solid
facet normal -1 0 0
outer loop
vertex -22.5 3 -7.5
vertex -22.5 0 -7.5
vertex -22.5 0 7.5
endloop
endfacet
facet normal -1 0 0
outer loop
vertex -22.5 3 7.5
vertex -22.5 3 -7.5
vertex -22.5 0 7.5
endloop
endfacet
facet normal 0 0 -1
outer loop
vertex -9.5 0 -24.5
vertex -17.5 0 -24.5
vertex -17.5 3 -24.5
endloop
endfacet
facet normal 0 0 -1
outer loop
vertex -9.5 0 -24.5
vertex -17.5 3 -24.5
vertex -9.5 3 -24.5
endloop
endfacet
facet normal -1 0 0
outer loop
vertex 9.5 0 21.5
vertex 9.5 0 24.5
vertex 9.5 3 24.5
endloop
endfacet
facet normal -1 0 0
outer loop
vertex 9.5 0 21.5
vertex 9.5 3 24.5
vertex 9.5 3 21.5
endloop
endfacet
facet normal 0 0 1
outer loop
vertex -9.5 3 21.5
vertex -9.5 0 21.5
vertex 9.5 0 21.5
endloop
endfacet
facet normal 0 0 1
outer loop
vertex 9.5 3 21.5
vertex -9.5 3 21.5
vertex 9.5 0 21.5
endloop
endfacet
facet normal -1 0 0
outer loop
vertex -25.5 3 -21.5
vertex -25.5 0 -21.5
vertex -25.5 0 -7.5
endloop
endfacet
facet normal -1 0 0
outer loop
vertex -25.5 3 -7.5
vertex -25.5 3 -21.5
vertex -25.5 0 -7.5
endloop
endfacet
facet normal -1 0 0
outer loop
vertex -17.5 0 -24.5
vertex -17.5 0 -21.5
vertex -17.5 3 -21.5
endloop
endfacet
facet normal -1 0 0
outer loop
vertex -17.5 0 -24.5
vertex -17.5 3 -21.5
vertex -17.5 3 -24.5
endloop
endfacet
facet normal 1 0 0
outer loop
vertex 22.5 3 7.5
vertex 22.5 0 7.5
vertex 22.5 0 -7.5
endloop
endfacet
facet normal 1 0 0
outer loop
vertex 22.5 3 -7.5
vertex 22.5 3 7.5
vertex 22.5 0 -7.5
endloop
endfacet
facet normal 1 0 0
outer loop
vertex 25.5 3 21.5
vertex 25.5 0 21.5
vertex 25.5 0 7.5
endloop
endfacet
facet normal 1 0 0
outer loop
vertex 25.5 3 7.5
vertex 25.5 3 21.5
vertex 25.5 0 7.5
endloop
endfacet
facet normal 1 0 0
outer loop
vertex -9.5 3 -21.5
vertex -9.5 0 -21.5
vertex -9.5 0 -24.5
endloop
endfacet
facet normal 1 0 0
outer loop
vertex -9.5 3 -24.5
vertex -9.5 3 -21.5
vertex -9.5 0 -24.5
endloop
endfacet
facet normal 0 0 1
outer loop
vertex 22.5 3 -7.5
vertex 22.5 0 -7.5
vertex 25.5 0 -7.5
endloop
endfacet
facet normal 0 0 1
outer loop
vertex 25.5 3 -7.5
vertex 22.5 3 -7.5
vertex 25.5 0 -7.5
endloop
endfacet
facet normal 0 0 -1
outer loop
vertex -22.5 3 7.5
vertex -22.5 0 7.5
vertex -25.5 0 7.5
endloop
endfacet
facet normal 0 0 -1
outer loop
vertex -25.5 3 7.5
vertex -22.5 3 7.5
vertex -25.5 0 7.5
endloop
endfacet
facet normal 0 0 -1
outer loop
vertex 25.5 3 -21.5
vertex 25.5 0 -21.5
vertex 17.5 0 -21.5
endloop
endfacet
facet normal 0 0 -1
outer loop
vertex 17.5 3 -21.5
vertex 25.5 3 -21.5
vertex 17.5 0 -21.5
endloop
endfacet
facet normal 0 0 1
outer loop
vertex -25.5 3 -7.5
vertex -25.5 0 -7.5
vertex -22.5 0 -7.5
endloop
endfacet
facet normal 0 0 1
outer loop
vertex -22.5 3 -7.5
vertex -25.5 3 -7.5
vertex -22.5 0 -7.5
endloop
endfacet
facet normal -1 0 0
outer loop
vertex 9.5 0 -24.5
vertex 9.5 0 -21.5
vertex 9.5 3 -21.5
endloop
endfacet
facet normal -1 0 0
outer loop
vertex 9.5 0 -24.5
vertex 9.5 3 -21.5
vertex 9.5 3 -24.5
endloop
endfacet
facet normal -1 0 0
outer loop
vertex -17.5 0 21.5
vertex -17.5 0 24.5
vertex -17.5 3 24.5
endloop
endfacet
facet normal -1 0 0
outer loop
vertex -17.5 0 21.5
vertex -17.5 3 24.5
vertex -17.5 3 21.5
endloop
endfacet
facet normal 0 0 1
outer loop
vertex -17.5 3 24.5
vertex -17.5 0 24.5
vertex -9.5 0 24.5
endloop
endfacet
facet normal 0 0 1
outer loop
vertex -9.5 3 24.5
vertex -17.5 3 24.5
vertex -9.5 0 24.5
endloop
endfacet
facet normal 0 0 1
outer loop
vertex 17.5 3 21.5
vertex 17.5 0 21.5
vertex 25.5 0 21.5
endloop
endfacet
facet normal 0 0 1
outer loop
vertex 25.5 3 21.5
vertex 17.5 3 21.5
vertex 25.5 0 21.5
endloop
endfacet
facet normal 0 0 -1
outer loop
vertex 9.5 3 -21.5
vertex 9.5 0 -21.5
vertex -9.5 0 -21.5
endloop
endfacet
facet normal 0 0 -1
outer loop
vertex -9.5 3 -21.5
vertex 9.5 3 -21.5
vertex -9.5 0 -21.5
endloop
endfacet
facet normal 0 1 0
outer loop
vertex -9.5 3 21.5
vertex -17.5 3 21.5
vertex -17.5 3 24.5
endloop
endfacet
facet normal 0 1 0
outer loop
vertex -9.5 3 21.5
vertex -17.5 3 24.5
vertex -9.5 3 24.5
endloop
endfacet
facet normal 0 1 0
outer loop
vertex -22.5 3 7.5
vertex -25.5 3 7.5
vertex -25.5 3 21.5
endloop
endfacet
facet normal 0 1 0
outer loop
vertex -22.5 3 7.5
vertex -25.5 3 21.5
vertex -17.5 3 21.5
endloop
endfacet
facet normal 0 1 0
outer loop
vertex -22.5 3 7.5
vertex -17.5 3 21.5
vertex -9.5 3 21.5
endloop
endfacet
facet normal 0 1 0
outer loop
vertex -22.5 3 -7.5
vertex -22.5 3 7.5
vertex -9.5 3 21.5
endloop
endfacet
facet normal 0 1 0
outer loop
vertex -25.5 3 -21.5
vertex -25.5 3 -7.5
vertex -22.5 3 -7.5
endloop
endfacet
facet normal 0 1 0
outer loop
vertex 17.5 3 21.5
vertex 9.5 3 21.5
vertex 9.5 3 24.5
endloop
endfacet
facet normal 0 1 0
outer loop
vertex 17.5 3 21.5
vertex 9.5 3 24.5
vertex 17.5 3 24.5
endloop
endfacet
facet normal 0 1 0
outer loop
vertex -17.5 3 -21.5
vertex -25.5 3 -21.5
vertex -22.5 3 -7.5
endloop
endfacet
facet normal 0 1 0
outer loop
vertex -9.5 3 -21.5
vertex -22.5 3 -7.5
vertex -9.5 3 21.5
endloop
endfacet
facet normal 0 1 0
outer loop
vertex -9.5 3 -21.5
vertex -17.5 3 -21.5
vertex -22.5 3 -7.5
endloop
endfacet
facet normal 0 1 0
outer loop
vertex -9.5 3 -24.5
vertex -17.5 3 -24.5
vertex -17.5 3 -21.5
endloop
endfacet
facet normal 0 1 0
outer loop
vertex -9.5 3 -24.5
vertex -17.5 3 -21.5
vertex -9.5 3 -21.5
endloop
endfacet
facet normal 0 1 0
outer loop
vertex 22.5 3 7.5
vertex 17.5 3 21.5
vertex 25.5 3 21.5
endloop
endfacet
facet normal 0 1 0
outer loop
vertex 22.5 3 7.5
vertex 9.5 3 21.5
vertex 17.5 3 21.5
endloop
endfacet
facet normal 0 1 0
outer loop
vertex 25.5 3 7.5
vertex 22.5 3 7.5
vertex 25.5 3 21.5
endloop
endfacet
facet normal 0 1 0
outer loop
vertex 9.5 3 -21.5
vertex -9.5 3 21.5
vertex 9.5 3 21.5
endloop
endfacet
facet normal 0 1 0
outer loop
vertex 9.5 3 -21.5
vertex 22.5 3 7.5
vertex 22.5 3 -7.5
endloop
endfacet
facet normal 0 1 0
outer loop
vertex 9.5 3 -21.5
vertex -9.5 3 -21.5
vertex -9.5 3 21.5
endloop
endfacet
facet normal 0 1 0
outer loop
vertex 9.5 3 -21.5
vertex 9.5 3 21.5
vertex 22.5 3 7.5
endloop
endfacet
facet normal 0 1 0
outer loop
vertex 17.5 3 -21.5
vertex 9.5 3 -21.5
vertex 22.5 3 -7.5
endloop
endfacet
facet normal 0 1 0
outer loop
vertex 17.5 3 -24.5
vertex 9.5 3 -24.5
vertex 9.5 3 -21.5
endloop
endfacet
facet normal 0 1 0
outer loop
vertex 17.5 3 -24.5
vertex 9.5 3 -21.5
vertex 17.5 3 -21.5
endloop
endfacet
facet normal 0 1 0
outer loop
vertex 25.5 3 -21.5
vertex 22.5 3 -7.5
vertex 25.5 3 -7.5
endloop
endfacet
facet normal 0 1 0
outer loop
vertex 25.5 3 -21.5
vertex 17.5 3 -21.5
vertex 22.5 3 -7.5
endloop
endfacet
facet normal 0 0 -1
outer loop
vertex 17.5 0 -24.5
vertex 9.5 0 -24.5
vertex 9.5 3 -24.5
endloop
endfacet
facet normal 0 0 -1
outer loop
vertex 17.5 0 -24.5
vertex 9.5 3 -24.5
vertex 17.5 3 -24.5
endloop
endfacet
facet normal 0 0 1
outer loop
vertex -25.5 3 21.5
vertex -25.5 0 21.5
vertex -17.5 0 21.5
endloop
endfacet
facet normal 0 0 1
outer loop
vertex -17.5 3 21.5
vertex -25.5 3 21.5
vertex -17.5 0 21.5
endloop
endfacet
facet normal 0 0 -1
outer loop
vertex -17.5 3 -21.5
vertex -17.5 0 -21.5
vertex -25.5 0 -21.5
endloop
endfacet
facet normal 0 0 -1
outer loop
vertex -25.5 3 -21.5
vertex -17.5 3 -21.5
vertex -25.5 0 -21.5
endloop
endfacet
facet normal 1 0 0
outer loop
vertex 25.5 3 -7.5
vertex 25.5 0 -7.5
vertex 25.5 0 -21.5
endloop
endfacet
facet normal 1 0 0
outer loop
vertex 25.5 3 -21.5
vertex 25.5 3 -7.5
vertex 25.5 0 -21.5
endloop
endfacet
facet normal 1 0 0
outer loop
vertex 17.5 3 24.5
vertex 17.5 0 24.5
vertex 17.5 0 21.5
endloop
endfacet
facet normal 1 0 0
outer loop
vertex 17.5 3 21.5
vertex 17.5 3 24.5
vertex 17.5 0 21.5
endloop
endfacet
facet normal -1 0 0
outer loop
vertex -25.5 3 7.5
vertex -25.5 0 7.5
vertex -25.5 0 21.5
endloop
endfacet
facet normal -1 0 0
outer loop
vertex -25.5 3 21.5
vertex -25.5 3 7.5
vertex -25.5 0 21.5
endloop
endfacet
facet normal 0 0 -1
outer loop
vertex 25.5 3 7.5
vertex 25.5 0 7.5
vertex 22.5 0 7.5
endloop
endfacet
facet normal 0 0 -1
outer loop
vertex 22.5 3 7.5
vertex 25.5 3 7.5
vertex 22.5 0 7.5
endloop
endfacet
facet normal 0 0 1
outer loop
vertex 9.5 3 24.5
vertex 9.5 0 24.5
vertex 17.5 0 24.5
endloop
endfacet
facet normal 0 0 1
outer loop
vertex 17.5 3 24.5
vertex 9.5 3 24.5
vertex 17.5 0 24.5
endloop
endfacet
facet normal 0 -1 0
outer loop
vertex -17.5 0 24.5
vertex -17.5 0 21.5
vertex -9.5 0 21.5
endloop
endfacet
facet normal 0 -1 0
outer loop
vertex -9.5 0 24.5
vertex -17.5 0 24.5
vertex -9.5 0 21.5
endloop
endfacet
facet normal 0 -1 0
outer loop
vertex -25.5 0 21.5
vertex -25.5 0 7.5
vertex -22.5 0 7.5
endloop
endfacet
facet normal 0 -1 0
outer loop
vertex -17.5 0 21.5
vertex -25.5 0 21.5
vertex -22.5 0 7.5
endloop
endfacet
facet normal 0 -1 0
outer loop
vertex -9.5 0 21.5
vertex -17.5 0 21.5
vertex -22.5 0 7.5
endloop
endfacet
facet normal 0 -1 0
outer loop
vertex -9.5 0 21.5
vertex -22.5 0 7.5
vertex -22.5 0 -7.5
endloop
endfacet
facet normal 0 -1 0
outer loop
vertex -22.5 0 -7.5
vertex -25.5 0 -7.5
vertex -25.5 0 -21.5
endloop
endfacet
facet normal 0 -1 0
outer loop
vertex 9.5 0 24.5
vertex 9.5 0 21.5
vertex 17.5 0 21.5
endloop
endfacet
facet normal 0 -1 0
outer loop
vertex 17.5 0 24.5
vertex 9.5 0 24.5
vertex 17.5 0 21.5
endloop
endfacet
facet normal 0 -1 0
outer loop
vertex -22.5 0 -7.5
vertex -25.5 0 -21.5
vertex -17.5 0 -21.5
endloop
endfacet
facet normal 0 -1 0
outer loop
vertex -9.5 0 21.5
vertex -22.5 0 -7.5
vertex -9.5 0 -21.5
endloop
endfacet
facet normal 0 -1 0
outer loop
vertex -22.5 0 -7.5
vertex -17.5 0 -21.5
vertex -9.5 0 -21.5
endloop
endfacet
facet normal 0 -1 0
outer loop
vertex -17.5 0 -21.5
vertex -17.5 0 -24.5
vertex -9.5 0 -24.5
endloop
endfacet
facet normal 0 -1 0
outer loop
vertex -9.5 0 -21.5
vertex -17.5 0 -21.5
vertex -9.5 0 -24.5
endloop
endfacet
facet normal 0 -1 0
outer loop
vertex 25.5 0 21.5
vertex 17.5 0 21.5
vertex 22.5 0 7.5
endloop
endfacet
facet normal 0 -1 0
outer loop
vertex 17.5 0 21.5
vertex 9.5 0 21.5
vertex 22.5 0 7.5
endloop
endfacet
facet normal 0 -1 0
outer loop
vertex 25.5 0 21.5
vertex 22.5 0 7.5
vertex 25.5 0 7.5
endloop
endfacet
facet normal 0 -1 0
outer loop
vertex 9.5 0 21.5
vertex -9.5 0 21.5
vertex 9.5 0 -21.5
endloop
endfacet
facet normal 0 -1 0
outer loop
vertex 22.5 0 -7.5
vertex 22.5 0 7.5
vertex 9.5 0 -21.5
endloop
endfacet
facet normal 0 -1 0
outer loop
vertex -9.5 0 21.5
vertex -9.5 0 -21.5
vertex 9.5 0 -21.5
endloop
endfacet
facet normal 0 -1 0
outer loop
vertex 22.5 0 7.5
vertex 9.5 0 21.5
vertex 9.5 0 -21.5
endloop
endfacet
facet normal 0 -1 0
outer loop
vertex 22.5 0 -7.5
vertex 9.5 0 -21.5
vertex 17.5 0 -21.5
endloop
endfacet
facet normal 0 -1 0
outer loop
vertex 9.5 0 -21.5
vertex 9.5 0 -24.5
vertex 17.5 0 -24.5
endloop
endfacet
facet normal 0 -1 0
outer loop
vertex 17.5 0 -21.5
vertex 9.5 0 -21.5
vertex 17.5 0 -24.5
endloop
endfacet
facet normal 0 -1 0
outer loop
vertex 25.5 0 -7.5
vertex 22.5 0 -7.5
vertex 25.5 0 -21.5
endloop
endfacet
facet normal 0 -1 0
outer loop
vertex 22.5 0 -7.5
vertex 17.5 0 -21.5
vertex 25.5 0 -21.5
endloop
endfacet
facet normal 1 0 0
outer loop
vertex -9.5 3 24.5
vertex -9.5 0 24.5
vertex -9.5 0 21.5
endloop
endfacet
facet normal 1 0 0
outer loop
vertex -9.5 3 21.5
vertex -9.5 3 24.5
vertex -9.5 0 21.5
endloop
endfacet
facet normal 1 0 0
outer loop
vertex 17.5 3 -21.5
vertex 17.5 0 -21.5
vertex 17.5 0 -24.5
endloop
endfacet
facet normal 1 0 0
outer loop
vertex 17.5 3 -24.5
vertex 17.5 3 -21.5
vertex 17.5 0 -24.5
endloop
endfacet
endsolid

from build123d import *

# Parameters (mm, degrees)
SKETCH_1_W      = 8
SKETCH_1_H      = 3
EXTRUDE_1_DEPTH = 3


with BuildPart() as part:
    # 草图1 → 凸台-拉伸1 (new body)
    with BuildSketch(Plane(origin=(0, 0, 0), x_dir=(1, 0, 0), z_dir=(0, 1, 0))):
        Polygon((-17.5, 21.5), (-25.5, 21.5), (-25.5, 7.5), (-22.5, 7.5), (-22.5, -7.5), (-25.5, -7.5), (-25.5, -21.5), (-17.5, -21.5), (-9.5, -21.5), (9.5, -21.5), (17.5, -21.5), (25.5, -21.5), (25.5, -7.5), (22.5, -7.5), (22.5, 7.5), (25.5, 7.5), (25.5, 21.5), (17.5, 21.5), (9.5, 21.5), (-9.5, 21.5), align=None)
        with Locations((-13.5, 23)):
            Rectangle(SKETCH_1_W, SKETCH_1_H)
        with Locations((13.5, 23)):
            Rectangle(SKETCH_1_W, SKETCH_1_H)
        with Locations((13.5, -23)):
            Rectangle(SKETCH_1_W, SKETCH_1_H)
        with Locations((-13.5, -23)):
            Rectangle(SKETCH_1_W, SKETCH_1_H)
    extrude(amount=EXTRUDE_1_DEPTH)


solid = part.part
